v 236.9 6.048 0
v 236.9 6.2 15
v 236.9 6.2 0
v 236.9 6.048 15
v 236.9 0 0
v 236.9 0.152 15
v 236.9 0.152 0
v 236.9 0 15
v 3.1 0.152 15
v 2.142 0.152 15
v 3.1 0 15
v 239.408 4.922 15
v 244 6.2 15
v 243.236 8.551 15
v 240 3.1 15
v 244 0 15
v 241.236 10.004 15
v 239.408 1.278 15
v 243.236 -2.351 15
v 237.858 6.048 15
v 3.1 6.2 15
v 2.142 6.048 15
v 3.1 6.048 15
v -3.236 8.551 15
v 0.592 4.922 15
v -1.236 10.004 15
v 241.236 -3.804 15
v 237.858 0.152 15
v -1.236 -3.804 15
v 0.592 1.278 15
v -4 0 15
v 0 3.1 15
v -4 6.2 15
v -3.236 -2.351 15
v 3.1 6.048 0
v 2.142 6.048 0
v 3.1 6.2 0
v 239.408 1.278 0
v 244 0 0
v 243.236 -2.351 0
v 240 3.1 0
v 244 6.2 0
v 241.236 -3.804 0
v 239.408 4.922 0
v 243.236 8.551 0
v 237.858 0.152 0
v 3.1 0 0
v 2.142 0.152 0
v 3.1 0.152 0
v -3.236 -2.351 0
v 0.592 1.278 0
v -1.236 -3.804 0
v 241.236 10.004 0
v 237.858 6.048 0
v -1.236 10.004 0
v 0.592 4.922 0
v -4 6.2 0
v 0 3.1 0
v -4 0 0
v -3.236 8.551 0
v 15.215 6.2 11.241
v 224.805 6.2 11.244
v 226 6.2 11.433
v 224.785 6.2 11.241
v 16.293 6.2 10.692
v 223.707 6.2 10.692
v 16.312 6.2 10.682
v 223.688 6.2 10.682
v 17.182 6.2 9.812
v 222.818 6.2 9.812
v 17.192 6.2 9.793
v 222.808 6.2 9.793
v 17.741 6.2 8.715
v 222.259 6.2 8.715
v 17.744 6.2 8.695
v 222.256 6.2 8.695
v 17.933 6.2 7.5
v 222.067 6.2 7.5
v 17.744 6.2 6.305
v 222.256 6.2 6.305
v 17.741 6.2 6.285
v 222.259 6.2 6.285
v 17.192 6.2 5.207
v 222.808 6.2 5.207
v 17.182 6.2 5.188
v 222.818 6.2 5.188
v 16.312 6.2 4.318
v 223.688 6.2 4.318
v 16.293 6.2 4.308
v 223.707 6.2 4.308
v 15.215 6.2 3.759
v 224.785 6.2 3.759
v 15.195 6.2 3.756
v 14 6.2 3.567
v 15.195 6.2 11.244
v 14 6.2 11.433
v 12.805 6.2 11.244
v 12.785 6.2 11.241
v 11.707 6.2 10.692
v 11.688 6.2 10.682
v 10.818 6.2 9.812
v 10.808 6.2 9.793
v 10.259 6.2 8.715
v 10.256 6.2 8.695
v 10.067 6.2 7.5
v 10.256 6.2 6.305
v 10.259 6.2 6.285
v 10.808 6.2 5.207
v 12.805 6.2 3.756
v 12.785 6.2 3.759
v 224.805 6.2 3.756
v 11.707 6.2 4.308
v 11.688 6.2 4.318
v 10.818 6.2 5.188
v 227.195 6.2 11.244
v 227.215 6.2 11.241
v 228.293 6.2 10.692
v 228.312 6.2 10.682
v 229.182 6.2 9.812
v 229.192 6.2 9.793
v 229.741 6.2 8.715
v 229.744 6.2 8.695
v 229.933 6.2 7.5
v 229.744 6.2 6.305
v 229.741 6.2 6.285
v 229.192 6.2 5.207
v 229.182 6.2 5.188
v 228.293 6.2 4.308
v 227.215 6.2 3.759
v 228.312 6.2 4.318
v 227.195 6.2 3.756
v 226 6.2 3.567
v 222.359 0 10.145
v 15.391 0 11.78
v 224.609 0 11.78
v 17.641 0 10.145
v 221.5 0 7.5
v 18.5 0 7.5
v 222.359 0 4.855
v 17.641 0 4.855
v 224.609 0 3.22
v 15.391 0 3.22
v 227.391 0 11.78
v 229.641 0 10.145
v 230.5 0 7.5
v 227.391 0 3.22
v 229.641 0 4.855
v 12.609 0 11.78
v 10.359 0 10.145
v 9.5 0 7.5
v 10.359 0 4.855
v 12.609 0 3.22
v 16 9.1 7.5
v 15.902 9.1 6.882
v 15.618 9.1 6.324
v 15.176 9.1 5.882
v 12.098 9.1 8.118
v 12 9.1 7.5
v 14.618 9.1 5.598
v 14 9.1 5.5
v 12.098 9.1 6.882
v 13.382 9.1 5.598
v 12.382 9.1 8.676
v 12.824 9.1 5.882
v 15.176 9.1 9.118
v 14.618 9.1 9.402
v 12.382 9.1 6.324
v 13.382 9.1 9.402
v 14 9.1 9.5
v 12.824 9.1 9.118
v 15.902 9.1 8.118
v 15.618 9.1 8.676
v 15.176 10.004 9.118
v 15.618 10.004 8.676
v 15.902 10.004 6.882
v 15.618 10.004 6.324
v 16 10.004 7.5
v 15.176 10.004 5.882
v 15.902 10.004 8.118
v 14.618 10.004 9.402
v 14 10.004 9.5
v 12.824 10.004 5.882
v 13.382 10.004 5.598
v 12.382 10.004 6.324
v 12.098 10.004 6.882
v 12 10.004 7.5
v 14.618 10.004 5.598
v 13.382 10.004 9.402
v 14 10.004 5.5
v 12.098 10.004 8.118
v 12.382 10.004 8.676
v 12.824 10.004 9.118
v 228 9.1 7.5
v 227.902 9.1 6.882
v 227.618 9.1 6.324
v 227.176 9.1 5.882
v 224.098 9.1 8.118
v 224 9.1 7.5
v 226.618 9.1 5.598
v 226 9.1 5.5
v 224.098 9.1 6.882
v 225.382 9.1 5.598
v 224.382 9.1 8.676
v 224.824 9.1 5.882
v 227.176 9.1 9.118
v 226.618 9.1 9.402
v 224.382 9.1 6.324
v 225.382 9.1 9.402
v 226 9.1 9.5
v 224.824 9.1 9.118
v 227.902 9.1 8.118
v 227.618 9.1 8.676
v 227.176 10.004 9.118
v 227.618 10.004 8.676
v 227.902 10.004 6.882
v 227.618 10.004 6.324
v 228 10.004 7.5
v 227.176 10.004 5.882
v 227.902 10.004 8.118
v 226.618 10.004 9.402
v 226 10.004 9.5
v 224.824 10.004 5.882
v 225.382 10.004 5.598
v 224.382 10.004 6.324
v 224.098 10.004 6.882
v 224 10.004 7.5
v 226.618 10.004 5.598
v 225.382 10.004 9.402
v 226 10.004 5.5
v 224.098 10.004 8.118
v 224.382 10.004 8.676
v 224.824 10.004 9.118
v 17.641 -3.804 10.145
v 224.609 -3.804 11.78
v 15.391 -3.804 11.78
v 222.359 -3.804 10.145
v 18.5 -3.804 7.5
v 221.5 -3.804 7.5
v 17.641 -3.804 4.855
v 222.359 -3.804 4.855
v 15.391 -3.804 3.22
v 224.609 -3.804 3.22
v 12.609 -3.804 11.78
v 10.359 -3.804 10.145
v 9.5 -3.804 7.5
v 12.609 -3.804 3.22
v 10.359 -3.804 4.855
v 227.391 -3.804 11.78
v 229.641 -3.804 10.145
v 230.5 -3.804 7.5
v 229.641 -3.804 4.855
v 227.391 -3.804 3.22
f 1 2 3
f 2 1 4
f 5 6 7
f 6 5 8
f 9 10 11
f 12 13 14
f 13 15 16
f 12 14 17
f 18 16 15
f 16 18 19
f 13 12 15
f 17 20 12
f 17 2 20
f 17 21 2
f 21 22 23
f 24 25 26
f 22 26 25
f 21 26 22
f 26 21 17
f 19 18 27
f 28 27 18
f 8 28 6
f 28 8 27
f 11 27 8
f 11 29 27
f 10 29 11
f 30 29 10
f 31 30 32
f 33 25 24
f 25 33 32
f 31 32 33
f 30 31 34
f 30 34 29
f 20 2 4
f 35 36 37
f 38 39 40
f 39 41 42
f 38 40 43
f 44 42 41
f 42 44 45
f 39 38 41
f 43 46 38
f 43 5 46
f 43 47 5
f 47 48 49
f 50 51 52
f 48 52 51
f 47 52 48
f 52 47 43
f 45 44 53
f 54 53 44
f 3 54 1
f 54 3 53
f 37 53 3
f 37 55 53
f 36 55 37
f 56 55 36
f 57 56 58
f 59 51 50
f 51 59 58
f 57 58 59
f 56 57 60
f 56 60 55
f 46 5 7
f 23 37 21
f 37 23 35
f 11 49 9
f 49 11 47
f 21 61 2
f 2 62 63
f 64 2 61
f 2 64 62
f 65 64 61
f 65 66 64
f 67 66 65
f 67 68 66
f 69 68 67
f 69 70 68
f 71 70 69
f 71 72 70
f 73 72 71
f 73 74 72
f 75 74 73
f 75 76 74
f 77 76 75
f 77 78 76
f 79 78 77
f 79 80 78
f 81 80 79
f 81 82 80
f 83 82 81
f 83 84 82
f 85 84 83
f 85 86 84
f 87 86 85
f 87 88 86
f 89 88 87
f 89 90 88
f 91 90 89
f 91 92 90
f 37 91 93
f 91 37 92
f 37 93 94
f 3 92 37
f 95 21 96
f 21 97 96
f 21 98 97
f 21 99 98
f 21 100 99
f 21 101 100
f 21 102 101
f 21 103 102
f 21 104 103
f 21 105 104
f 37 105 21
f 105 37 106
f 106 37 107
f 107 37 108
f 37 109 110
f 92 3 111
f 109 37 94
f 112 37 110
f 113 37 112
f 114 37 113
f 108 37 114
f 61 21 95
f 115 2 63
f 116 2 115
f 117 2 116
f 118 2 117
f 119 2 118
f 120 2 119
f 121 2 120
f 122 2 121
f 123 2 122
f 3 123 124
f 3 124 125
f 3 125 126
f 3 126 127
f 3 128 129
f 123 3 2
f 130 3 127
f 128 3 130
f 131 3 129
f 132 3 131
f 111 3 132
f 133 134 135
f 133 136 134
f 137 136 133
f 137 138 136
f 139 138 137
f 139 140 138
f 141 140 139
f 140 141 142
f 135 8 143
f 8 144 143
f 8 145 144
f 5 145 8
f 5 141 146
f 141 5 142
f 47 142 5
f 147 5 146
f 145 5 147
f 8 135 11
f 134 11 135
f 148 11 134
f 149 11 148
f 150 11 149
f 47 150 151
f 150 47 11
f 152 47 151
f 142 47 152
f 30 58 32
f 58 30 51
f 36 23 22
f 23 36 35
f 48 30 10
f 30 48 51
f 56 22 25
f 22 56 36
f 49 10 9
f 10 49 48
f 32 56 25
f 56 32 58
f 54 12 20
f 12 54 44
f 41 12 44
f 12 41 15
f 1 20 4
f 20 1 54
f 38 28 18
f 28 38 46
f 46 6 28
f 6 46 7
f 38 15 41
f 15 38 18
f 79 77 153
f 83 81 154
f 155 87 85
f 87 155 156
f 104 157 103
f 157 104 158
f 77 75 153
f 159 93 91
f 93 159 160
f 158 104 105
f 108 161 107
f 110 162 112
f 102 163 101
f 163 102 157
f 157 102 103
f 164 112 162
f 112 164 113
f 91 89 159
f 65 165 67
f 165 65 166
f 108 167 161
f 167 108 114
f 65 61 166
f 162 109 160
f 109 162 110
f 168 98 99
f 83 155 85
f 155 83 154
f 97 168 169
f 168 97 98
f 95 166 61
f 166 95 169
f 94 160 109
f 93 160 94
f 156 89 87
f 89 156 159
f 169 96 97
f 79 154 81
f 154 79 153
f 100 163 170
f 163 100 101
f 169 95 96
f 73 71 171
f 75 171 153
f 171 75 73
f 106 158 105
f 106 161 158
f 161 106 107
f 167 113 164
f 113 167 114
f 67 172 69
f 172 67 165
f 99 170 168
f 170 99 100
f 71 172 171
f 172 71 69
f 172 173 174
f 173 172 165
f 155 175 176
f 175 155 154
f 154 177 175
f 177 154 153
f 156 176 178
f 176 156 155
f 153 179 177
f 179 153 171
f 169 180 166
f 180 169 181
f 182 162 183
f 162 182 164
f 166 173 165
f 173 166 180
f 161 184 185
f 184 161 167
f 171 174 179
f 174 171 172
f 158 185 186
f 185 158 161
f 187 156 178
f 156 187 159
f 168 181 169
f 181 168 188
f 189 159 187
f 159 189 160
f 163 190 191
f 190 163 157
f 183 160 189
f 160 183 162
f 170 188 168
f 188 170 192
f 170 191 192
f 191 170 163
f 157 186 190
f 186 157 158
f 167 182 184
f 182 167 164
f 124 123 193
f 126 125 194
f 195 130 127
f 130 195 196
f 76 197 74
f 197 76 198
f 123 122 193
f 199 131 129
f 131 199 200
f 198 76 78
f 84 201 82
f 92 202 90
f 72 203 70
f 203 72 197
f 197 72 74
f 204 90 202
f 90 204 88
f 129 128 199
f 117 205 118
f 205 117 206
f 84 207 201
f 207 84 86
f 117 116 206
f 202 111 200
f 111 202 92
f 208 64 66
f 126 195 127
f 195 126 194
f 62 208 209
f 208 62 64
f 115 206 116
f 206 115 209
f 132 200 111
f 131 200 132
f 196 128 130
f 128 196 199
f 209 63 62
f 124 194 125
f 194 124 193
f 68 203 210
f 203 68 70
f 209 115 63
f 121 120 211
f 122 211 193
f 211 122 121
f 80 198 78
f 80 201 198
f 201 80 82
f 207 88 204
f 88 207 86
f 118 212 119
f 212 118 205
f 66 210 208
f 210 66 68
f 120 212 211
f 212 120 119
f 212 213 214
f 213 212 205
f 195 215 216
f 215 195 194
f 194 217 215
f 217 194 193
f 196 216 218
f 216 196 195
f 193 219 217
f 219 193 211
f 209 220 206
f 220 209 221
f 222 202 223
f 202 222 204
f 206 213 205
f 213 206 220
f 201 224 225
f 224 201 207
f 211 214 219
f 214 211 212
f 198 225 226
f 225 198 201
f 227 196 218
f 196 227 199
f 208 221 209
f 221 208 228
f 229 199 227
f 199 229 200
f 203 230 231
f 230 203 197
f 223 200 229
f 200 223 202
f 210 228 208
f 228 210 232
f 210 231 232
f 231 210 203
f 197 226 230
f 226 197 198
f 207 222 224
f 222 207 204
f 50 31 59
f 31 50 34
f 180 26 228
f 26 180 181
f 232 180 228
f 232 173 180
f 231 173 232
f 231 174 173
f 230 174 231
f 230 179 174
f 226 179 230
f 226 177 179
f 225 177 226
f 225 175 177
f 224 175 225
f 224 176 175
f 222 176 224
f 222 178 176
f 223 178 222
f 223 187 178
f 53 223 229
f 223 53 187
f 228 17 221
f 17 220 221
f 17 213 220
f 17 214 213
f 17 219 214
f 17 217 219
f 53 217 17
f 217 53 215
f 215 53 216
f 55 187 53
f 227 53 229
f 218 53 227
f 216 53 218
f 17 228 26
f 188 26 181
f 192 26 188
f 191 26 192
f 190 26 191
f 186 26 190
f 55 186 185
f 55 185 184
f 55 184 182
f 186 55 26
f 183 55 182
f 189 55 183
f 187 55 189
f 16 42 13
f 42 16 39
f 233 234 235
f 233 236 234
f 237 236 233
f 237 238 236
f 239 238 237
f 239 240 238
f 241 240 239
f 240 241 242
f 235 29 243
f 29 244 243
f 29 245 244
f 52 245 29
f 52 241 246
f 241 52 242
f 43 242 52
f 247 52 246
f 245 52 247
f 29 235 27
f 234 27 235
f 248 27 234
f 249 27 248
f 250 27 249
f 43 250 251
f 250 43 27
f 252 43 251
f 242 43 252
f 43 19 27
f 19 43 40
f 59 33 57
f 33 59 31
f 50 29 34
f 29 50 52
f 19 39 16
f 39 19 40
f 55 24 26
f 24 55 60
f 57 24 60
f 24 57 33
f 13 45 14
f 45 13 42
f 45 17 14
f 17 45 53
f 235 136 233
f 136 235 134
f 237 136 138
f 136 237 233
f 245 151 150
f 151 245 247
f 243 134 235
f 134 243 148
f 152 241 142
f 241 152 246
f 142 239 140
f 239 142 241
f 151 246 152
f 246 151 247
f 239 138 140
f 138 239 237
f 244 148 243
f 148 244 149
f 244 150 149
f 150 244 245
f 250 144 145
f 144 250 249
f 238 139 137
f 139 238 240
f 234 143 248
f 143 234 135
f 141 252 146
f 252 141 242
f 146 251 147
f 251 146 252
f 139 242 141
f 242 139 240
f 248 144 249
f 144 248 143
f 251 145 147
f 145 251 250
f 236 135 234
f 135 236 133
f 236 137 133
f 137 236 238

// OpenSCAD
slot_length=240;
slot_width=6.2;

molle_length=10;
molle_distance=48;
molle_width=2;

wall_width=4;
molle_separator_width=wall_width;

entry_hole_d=9;
entry_hole_offset=10+wall_width;

depth=15;

height=depth+25;

$fn=10;

module base() {
    //width excluding 'minkowsky' sum
  internal_width = slot_width;
  minkowski() {
    cube([slot_length, internal_width, 0.5*depth], center=false);
    cylinder(r=wall_width, h=0.5*depth, center=false);
}
}

module slot_cube(length, width, depth) {
    cube_length = length-width;
    translate([0.5*width, 0, 0]){
    cube([cube_length, width, depth], center=false);
    translate([0, 0.5*width, 0]) {cylinder(h=depth, d=width, center=false);}
    translate([cube_length, 0.5*width, 0]) {cylinder(h=depth, d=width, center=false);}
}}

module gen_molle_slots(length) {
    molle_target_length=length-2*wall_width;
    echo ("molle_target_length", molle_target_length);
    count = floor((molle_target_length + molle_separator_width) / (molle_length + molle_separator_width));
    echo ("count", count);
    molle_total_length = count*molle_length + (count-1) * molle_separator_width;
    echo ("molle_total_length1", molle_total_length);
    initial_offset = 0.5 * (length - molle_total_length);
    echo("initia_offset", initial_offset);
    for(i = [0:count-1]) {
        offset = initial_offset + (molle_length+molle_distance)*i;
        echo ("offset", offset, i);
        translate([offset, 0, 0]) {slot_cube(molle_length, molle_width, height);}
    }

}

module screw_countersunk(
        l=20,   //length
        dh = 8,   //head dia
        lh = 3,   //head length
        ds = 4,  //shaft dia
        $fn=20,
        )
{
    union() {
        cylinder(h=lh, r1=dh/2, r2=ds/2);
        cylinder(h=l, d=ds);
    }
}


difference() {
  base();
  slot_cube(slot_length, slot_width, depth);
  translate([entry_hole_offset, 0, 0.5*depth]) rotate([90, 0, 0]) cylinder(d=entry_hole_d, h=wall_width);
  translate([slot_length - entry_hole_offset, 0, 0.5*depth]) rotate([90, 0, 0]) cylinder(d=entry_hole_d, h=wall_width);
  translate([entry_hole_offset, slot_width-0.1, 0.5*depth]) rotate([-90, 0, 0]) screw_countersunk(); 
  translate([slot_length - entry_hole_offset, slot_width-0.1, 0.5*depth]) rotate([-90, 0, 0]) screw_countersunk();
  
}

  
   
